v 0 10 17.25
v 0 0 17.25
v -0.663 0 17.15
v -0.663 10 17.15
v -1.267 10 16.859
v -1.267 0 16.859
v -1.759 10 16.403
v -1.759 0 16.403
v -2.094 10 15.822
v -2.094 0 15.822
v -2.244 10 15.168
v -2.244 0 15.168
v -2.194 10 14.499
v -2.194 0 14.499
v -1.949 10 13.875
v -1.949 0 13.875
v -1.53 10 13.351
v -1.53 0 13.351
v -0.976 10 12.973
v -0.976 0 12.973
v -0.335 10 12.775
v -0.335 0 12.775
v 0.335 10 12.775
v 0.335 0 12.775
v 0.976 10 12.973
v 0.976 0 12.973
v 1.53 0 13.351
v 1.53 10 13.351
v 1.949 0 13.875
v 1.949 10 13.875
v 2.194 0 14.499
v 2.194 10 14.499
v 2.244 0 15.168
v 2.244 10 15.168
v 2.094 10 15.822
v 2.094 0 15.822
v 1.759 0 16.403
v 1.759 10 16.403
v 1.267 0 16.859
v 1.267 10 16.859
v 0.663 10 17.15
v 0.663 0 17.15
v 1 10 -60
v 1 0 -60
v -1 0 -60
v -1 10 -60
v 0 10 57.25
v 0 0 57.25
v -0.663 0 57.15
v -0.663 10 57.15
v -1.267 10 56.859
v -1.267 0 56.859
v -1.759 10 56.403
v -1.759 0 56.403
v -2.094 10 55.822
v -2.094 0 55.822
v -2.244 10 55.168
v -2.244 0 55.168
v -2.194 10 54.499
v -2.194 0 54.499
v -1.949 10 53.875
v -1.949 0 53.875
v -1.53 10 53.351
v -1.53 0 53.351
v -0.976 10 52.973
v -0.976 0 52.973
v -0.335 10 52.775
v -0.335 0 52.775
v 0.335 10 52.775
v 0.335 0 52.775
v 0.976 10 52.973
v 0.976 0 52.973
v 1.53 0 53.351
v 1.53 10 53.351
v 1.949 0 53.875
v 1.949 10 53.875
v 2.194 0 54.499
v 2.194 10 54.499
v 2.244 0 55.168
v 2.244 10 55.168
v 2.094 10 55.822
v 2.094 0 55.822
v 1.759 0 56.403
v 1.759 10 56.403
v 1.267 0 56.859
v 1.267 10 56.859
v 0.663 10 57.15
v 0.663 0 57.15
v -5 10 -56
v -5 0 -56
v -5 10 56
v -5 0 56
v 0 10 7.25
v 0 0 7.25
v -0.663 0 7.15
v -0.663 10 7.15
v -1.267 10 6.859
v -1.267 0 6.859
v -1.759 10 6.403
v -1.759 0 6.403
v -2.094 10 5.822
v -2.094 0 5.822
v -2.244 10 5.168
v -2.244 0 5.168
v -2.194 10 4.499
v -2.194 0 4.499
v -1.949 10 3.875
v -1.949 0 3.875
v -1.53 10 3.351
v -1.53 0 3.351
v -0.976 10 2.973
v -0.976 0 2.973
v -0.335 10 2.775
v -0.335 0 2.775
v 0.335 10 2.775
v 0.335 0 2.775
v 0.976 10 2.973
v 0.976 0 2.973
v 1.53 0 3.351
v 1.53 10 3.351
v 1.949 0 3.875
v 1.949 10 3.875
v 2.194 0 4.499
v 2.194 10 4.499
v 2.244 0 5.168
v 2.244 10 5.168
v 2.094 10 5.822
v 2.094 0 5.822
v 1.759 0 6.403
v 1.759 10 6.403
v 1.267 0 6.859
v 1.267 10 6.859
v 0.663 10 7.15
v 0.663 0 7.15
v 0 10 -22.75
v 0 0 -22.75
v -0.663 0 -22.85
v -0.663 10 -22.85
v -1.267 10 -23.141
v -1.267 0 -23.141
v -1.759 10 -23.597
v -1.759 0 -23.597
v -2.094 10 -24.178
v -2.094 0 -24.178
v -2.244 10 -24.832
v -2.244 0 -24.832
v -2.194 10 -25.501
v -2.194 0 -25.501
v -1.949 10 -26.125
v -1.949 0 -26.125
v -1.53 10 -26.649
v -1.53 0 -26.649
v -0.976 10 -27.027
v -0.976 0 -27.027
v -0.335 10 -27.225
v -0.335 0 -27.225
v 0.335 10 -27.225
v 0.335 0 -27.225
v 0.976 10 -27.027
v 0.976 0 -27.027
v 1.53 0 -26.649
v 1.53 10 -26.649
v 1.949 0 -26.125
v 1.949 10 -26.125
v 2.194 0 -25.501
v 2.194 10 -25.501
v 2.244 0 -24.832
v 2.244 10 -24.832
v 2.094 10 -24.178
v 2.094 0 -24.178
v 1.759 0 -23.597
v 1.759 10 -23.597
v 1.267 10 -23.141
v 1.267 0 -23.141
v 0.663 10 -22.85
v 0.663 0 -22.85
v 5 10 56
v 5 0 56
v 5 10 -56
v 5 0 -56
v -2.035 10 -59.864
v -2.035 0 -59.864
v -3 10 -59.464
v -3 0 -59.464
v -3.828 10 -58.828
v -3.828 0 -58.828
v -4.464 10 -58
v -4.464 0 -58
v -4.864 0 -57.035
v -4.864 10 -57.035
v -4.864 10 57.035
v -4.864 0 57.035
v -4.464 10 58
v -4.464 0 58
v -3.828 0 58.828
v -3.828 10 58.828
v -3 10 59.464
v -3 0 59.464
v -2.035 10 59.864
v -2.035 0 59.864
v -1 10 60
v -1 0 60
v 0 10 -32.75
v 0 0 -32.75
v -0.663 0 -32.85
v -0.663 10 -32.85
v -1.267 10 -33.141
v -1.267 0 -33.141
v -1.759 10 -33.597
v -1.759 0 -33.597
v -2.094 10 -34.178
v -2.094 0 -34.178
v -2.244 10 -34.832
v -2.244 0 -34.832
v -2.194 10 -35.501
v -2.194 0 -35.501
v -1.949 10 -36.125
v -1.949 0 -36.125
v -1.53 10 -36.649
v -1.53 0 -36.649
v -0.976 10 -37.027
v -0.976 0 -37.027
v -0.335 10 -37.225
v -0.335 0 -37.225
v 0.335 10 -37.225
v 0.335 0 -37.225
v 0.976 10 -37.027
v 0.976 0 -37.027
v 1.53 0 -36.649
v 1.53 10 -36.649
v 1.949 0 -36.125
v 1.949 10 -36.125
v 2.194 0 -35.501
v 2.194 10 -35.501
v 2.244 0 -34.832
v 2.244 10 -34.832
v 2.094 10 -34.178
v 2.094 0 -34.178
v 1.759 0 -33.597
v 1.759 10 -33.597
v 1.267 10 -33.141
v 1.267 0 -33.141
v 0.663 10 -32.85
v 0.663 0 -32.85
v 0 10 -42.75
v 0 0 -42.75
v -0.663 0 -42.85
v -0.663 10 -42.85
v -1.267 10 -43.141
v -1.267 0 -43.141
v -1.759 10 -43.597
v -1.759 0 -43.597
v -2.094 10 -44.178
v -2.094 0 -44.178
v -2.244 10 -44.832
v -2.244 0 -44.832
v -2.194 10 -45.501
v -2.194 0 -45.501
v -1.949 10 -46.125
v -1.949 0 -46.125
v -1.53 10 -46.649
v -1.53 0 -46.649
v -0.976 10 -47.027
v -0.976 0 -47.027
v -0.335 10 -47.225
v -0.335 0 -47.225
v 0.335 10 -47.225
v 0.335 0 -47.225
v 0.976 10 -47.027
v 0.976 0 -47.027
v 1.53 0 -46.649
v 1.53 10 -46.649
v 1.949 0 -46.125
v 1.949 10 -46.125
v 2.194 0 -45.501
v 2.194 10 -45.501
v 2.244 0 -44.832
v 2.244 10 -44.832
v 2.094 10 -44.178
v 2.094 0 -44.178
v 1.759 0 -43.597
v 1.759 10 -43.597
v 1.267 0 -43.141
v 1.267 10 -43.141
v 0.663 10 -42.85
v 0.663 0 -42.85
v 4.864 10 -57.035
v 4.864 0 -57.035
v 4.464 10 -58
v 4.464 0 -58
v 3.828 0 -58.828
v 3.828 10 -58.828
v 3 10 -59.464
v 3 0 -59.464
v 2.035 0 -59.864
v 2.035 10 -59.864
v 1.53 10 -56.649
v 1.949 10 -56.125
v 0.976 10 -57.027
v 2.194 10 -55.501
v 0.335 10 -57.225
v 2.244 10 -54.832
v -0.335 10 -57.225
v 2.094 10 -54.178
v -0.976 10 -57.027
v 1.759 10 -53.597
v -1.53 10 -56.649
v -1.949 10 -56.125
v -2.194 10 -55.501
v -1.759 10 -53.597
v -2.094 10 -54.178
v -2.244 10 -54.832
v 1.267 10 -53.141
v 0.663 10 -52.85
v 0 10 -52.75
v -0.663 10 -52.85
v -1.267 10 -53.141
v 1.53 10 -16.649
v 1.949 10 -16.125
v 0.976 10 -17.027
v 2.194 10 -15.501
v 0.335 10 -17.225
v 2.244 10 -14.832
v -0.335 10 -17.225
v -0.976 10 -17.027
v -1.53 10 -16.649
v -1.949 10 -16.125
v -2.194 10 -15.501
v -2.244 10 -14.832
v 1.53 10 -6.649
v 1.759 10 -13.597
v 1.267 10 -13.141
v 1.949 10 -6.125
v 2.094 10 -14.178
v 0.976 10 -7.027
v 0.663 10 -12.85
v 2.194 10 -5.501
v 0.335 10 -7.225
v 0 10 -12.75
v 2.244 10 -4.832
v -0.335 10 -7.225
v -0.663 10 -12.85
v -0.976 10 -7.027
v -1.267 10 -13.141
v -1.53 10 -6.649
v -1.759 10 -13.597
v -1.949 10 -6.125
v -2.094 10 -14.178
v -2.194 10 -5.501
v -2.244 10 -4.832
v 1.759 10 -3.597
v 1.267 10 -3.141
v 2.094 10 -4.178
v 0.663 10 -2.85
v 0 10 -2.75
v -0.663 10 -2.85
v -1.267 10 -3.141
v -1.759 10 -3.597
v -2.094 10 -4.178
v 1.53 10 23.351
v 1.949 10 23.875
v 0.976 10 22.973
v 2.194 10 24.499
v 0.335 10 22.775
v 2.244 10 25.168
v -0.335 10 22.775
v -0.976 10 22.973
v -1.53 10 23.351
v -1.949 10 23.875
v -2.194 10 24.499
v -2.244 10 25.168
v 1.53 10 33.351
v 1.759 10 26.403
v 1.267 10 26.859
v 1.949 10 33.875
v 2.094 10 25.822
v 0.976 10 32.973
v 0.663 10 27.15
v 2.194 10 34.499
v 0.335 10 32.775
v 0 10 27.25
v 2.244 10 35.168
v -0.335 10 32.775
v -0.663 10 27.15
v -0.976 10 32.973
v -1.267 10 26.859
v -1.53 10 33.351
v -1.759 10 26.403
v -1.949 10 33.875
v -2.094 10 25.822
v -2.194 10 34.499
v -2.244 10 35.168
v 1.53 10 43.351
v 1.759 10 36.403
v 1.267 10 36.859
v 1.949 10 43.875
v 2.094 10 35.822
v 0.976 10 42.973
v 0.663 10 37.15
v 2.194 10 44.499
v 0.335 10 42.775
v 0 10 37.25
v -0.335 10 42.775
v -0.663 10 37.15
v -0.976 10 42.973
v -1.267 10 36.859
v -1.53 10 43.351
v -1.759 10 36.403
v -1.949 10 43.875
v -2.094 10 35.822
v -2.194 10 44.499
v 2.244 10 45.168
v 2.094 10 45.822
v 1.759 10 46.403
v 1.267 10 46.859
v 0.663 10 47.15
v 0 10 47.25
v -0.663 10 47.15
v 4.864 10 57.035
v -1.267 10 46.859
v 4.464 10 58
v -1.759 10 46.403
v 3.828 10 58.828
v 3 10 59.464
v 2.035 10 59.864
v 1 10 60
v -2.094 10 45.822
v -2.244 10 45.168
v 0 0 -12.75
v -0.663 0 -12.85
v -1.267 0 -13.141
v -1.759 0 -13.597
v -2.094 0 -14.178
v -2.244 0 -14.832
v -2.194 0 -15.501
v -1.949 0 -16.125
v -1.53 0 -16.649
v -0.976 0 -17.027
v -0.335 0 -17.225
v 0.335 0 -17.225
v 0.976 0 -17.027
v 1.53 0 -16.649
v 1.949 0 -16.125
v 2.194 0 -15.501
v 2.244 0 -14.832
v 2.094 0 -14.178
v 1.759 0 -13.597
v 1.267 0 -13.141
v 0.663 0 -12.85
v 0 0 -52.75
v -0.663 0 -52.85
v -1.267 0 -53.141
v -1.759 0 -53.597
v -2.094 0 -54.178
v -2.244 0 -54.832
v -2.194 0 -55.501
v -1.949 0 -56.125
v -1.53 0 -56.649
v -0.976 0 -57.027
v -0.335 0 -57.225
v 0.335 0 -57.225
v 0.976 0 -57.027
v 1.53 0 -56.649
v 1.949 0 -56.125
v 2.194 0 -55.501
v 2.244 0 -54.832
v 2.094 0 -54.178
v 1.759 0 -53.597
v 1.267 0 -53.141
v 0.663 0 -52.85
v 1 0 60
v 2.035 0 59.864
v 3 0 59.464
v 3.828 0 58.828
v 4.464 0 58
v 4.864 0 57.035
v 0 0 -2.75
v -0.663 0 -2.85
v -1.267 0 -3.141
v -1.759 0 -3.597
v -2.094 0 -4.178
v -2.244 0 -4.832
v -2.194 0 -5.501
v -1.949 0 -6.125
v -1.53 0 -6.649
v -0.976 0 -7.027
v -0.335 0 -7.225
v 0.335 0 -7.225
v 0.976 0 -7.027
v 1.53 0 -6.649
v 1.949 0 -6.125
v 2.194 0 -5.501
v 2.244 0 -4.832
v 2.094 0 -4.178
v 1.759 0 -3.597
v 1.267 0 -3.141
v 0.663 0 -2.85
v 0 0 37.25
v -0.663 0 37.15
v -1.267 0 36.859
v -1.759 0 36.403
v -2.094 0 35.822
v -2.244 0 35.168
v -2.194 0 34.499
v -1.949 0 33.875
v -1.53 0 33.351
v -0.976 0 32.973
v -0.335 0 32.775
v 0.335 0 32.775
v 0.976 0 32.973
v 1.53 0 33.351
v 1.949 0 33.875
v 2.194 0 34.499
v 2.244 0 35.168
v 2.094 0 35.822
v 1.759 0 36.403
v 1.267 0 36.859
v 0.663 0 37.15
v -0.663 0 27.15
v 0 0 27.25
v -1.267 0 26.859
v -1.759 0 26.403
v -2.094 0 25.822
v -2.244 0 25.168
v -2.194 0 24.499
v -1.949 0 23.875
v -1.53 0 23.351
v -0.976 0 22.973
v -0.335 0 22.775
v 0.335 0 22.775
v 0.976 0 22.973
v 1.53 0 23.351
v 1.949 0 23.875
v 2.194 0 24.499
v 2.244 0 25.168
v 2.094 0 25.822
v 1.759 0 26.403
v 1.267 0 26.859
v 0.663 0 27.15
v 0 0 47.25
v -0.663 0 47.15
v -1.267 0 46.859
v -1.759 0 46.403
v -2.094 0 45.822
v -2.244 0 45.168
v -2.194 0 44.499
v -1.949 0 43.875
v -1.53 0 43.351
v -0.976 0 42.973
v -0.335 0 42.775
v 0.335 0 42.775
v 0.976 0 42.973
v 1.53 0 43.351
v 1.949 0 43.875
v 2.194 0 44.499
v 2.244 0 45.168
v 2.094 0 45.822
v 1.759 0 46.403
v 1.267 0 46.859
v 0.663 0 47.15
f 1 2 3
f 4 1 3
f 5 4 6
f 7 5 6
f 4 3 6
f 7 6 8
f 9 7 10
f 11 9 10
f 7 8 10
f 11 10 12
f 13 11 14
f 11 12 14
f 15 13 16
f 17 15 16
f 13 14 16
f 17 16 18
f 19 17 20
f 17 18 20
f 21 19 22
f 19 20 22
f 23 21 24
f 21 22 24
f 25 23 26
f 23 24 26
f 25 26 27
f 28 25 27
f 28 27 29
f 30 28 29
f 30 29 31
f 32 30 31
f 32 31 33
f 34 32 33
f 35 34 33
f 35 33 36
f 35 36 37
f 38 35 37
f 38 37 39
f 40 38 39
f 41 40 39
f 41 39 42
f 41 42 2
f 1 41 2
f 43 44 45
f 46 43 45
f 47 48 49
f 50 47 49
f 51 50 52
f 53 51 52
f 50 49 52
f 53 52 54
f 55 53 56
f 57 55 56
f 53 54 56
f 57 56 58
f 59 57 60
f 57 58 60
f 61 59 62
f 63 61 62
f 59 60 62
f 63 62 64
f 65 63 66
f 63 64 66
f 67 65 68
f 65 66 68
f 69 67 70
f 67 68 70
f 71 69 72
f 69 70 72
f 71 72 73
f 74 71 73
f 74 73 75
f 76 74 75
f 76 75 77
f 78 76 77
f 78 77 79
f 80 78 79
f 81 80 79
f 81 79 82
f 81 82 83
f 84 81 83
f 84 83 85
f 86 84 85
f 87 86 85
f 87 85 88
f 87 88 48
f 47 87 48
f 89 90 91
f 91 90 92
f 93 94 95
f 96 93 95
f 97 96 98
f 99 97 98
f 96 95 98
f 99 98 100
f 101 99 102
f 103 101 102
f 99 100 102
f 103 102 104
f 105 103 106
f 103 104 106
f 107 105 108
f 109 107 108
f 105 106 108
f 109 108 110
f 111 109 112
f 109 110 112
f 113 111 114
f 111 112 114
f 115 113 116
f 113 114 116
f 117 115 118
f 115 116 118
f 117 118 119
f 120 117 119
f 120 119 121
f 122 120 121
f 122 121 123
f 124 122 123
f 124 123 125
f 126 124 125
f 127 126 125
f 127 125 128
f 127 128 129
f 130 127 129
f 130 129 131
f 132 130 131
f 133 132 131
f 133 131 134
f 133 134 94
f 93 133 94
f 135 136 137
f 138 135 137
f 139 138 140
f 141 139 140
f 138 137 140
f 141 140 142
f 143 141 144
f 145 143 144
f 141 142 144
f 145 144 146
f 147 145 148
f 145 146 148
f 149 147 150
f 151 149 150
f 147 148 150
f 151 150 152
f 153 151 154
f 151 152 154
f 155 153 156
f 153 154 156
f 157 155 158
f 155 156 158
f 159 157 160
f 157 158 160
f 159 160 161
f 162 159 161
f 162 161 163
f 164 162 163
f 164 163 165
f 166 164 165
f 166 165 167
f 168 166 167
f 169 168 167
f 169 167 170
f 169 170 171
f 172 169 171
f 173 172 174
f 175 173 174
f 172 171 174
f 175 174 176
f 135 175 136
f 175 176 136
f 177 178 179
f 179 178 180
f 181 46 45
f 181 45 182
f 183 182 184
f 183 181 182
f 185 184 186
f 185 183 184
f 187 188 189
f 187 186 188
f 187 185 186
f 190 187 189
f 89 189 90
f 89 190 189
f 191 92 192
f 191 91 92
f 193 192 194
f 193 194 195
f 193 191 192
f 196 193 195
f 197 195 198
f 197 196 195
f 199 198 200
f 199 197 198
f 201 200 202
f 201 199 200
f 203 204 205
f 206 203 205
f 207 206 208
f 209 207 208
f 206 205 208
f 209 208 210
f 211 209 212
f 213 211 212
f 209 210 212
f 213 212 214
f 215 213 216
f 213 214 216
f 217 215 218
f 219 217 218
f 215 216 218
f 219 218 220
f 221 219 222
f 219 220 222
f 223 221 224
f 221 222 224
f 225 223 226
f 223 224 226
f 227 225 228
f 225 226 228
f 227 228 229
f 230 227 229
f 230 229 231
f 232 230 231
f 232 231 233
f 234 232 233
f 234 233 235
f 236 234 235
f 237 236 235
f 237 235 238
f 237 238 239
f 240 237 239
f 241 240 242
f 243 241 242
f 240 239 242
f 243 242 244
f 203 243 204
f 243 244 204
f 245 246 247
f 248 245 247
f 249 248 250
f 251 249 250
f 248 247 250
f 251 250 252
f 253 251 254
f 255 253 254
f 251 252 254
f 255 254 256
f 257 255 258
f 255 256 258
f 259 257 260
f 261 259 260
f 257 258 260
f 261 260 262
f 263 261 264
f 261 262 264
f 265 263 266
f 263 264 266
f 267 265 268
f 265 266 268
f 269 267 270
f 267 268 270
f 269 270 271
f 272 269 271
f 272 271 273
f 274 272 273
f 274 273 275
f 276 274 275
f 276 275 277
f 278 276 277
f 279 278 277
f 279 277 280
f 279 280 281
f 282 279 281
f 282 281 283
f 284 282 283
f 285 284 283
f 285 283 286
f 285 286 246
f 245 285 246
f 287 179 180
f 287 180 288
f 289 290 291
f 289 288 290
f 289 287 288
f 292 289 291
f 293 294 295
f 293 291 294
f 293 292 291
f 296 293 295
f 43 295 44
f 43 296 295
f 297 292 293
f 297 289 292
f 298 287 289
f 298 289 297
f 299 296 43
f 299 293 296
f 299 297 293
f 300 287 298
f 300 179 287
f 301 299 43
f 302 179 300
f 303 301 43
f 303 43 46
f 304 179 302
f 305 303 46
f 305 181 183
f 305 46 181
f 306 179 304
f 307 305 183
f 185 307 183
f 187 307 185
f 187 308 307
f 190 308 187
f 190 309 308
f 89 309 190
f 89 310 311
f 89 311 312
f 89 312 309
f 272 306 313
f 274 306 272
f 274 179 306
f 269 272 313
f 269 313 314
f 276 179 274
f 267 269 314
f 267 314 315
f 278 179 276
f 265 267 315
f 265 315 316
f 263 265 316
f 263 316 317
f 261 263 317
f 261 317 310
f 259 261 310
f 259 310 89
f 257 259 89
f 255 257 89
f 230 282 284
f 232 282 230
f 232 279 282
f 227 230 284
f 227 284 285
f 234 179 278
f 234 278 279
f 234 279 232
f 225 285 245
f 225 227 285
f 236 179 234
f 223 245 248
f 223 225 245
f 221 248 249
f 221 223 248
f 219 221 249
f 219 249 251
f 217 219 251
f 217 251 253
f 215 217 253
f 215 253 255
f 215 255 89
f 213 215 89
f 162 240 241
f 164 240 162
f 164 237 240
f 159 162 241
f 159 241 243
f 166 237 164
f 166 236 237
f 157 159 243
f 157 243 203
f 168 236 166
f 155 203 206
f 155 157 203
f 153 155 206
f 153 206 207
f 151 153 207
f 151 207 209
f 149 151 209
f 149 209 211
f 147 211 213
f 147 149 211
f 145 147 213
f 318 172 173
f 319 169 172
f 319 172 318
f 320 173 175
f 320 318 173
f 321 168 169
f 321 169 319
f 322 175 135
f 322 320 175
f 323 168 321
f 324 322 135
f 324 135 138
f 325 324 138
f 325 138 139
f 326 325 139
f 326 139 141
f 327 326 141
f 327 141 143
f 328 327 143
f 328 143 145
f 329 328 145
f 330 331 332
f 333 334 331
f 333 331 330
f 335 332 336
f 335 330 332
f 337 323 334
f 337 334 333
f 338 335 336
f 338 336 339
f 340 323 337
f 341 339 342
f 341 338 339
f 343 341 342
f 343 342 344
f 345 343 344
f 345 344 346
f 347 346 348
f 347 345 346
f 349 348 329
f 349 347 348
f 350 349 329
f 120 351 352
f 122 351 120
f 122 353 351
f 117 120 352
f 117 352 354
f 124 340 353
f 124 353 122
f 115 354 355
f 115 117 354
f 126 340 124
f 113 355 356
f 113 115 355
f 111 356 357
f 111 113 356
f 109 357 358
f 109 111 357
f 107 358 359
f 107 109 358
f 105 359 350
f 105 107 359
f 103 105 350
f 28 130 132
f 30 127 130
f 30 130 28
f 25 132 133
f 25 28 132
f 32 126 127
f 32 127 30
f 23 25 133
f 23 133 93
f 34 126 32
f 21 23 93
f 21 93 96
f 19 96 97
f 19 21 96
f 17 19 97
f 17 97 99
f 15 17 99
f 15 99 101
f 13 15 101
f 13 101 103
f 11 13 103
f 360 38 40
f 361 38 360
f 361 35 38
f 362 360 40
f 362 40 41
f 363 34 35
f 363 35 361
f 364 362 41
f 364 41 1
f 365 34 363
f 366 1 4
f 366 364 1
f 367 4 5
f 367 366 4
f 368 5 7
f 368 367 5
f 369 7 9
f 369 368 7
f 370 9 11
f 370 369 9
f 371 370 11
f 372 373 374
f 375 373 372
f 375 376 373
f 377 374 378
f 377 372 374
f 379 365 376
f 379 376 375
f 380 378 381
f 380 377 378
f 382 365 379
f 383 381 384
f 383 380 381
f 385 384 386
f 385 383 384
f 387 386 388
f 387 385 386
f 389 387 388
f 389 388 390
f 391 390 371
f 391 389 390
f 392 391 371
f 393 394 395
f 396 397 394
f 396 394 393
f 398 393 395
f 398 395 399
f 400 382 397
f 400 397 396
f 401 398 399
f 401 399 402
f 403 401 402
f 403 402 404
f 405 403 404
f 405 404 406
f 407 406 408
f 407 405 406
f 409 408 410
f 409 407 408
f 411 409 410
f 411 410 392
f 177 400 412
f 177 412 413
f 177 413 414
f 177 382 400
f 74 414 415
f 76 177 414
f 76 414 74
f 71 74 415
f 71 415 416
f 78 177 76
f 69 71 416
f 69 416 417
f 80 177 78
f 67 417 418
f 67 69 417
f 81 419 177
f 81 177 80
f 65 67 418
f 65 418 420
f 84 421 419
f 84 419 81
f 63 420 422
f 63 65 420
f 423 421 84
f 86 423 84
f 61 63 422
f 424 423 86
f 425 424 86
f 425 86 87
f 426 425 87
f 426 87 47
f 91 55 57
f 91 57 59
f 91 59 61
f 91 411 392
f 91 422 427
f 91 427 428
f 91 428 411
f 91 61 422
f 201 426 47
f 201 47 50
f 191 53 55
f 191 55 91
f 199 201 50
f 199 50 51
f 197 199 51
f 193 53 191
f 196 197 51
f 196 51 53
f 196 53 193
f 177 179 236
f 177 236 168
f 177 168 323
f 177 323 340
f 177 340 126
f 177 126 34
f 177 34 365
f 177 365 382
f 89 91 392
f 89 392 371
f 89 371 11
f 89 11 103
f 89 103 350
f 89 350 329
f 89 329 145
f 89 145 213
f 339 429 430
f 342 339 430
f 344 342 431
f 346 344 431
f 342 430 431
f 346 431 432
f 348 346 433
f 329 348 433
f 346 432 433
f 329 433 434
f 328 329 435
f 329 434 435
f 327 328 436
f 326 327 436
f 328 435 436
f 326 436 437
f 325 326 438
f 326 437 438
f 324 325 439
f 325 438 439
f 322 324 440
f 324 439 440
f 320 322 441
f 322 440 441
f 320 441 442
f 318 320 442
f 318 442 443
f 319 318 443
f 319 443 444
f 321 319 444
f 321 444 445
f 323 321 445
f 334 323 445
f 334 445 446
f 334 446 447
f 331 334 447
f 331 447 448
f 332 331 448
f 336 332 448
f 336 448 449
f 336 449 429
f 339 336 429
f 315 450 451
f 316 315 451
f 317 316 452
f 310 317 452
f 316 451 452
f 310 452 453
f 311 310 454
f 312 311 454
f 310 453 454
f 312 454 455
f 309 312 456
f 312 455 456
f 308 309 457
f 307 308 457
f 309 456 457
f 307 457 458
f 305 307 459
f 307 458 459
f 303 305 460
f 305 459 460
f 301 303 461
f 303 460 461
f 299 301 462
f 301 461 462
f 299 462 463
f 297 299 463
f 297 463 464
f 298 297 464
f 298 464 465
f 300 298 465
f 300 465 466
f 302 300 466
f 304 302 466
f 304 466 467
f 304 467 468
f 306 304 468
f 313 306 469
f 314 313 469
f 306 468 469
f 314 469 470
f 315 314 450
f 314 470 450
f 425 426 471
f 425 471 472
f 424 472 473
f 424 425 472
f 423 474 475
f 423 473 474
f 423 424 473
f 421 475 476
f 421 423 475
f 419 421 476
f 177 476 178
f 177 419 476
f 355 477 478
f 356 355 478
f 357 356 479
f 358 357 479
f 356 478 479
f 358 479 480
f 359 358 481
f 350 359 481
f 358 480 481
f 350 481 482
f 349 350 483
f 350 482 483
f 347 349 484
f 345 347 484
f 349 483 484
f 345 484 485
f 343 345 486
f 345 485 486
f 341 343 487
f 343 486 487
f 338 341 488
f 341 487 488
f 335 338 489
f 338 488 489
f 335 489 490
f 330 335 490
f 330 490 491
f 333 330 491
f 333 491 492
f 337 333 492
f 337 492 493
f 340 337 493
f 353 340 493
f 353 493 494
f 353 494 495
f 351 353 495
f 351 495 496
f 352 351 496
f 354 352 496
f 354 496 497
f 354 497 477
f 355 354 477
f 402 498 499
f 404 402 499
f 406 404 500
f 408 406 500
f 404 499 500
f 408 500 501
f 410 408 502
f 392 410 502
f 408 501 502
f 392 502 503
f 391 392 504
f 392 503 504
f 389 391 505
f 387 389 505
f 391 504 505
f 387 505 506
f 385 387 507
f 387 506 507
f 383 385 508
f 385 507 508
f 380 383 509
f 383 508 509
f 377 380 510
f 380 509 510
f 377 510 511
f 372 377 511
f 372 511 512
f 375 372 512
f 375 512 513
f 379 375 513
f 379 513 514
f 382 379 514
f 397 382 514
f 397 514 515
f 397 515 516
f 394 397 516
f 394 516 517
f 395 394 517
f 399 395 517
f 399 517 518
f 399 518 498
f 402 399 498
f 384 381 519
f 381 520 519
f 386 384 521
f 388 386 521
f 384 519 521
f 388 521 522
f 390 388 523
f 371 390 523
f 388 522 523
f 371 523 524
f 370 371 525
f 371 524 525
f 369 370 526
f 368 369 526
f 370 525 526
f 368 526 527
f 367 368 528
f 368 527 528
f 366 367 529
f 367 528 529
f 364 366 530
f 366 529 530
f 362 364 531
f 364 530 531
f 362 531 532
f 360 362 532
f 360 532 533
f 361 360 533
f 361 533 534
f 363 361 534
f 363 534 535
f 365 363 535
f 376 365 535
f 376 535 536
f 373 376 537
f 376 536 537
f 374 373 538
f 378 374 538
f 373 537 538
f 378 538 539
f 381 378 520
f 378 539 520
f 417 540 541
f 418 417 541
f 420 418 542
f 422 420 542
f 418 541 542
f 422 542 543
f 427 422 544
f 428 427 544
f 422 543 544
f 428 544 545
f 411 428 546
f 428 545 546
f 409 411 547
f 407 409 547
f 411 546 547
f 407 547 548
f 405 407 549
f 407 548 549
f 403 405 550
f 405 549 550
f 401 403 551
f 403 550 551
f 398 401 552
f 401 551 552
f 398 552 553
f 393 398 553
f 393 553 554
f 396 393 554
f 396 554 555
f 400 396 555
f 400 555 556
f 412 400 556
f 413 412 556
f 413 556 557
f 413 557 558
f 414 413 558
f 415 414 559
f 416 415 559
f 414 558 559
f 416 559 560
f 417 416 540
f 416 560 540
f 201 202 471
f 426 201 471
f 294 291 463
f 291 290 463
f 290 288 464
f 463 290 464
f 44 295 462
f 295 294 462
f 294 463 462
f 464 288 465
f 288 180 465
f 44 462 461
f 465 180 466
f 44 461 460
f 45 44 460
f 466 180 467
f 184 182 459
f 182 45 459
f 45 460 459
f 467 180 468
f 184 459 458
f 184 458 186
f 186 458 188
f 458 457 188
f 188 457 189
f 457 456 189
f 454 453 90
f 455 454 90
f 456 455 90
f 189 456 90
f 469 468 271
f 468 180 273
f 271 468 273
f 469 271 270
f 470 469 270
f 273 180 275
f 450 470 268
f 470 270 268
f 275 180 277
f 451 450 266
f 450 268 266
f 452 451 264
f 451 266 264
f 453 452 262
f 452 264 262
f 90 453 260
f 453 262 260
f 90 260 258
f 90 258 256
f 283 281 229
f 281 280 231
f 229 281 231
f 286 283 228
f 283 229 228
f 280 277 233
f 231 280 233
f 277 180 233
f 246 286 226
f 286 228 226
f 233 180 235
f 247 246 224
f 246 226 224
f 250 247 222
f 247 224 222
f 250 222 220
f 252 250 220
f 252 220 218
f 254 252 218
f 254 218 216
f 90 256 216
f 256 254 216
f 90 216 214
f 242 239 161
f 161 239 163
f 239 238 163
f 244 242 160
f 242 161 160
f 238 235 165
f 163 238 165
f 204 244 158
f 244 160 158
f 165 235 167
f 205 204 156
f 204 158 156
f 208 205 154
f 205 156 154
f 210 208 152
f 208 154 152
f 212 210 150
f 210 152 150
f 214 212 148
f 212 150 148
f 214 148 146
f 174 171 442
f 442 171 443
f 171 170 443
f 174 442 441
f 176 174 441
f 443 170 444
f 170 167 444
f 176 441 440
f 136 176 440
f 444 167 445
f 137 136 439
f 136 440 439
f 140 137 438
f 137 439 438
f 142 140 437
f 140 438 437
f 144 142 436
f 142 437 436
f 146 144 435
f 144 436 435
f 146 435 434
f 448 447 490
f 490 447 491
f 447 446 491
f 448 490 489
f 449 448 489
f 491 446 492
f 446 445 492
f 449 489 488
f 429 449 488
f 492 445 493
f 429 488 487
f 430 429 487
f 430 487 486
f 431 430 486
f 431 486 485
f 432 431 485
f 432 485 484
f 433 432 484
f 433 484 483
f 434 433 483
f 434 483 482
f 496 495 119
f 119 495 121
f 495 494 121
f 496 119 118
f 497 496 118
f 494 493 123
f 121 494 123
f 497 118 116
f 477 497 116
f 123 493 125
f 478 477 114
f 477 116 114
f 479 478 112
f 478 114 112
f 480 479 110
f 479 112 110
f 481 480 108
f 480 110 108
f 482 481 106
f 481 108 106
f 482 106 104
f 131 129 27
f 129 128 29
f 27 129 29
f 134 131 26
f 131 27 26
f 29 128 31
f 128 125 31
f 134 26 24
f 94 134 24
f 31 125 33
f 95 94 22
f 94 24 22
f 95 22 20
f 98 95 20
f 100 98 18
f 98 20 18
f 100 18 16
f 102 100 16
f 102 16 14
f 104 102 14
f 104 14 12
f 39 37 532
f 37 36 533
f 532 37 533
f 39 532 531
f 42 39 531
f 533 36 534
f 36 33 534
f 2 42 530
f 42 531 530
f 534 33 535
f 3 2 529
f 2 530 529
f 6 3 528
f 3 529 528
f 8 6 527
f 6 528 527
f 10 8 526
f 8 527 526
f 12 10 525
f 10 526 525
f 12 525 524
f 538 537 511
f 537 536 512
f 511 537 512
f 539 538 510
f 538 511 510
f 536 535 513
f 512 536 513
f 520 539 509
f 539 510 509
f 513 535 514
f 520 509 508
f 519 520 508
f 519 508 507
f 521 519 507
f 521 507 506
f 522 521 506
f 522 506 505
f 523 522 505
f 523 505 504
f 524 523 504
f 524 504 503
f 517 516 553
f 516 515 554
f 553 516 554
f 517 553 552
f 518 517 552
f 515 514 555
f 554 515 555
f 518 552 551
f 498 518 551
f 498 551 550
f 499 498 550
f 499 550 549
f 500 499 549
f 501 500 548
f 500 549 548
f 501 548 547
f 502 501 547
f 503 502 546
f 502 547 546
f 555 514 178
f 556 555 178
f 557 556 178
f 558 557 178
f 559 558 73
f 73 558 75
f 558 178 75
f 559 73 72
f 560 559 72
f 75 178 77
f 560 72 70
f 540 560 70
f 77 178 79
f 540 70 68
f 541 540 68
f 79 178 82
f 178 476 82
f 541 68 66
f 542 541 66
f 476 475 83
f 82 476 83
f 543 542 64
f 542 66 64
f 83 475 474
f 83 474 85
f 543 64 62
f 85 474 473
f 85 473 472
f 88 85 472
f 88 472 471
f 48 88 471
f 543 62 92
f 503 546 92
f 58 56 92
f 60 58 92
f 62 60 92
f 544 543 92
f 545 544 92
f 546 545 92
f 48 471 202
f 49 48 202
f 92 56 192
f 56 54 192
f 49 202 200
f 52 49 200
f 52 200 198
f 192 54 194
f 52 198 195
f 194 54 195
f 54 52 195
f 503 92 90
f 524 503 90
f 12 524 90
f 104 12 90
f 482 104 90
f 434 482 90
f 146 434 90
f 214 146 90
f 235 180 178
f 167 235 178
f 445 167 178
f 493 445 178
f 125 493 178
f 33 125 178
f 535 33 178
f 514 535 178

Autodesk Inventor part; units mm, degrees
ref_plane "YZ Plane" through (0, 0, 0) normal (1, 0, 0) x (0, 1, 0)
ref_plane "XZ Plane" through (0, 0, 0) normal (0, 1, 0) x (-1, 0, 0)
ref_plane "XY Plane" through (0, 0, 0) normal (0, 0, 1) x (1, 0, 0)
sketch "Sketch1" plane through (0, 0, 0) normal (0, 1, 0) x (-1, 0, 0)
  line L0 (5, 60) -> (-5, 60)
  line L1 (-5, 60) -> (-5, -60)
  line L2 (-5, -60) -> (5, -60)
  line L3 (5, -60) -> (5, 60)
  line L4 (5, 60) -> (-5, -60) construction
  line L5 (-5, 60) -> (5, -60) construction
  point P0 (0, 0)
  dimension "d0" = 10
  dimension "d1" = 120
extrude "Extrusion1" add sketch "Sketch1" along normal blind 10
fillet "Fillet1" radius 4 4 edges at (5, 5, 60) (-5, 5, 60) (-5, 5, -60) (5, 5, -60)
sketch "Sketch2" plane through (0, 10, 0) normal (0, 1, 0) x (1, 0, 0)
  line L0 (1, 60) -> (-1, 60) projected
  line L1 (0, 60) -> (0, -50)
  line L2 (-1, 60) -> (-1, 55)
  arc A0 (-1, 60) -> (-5, 56) centre (-1, 56) ccw projected
  line L3 (-1, 55) -> (0, 55)
  point P0 (0, 0)
  dimension "d5" = 110
  dimension "d6" = 5
hole "Hole1" at (0, 10, -55) direction (0, -1, 0) diameter 4.5 depth 12
pattern_linear "Rectangular Pattern1" count 12 spacing 10 along (0, 0, 1) of "Hole1"
properties part number "soporte de direccion2"
